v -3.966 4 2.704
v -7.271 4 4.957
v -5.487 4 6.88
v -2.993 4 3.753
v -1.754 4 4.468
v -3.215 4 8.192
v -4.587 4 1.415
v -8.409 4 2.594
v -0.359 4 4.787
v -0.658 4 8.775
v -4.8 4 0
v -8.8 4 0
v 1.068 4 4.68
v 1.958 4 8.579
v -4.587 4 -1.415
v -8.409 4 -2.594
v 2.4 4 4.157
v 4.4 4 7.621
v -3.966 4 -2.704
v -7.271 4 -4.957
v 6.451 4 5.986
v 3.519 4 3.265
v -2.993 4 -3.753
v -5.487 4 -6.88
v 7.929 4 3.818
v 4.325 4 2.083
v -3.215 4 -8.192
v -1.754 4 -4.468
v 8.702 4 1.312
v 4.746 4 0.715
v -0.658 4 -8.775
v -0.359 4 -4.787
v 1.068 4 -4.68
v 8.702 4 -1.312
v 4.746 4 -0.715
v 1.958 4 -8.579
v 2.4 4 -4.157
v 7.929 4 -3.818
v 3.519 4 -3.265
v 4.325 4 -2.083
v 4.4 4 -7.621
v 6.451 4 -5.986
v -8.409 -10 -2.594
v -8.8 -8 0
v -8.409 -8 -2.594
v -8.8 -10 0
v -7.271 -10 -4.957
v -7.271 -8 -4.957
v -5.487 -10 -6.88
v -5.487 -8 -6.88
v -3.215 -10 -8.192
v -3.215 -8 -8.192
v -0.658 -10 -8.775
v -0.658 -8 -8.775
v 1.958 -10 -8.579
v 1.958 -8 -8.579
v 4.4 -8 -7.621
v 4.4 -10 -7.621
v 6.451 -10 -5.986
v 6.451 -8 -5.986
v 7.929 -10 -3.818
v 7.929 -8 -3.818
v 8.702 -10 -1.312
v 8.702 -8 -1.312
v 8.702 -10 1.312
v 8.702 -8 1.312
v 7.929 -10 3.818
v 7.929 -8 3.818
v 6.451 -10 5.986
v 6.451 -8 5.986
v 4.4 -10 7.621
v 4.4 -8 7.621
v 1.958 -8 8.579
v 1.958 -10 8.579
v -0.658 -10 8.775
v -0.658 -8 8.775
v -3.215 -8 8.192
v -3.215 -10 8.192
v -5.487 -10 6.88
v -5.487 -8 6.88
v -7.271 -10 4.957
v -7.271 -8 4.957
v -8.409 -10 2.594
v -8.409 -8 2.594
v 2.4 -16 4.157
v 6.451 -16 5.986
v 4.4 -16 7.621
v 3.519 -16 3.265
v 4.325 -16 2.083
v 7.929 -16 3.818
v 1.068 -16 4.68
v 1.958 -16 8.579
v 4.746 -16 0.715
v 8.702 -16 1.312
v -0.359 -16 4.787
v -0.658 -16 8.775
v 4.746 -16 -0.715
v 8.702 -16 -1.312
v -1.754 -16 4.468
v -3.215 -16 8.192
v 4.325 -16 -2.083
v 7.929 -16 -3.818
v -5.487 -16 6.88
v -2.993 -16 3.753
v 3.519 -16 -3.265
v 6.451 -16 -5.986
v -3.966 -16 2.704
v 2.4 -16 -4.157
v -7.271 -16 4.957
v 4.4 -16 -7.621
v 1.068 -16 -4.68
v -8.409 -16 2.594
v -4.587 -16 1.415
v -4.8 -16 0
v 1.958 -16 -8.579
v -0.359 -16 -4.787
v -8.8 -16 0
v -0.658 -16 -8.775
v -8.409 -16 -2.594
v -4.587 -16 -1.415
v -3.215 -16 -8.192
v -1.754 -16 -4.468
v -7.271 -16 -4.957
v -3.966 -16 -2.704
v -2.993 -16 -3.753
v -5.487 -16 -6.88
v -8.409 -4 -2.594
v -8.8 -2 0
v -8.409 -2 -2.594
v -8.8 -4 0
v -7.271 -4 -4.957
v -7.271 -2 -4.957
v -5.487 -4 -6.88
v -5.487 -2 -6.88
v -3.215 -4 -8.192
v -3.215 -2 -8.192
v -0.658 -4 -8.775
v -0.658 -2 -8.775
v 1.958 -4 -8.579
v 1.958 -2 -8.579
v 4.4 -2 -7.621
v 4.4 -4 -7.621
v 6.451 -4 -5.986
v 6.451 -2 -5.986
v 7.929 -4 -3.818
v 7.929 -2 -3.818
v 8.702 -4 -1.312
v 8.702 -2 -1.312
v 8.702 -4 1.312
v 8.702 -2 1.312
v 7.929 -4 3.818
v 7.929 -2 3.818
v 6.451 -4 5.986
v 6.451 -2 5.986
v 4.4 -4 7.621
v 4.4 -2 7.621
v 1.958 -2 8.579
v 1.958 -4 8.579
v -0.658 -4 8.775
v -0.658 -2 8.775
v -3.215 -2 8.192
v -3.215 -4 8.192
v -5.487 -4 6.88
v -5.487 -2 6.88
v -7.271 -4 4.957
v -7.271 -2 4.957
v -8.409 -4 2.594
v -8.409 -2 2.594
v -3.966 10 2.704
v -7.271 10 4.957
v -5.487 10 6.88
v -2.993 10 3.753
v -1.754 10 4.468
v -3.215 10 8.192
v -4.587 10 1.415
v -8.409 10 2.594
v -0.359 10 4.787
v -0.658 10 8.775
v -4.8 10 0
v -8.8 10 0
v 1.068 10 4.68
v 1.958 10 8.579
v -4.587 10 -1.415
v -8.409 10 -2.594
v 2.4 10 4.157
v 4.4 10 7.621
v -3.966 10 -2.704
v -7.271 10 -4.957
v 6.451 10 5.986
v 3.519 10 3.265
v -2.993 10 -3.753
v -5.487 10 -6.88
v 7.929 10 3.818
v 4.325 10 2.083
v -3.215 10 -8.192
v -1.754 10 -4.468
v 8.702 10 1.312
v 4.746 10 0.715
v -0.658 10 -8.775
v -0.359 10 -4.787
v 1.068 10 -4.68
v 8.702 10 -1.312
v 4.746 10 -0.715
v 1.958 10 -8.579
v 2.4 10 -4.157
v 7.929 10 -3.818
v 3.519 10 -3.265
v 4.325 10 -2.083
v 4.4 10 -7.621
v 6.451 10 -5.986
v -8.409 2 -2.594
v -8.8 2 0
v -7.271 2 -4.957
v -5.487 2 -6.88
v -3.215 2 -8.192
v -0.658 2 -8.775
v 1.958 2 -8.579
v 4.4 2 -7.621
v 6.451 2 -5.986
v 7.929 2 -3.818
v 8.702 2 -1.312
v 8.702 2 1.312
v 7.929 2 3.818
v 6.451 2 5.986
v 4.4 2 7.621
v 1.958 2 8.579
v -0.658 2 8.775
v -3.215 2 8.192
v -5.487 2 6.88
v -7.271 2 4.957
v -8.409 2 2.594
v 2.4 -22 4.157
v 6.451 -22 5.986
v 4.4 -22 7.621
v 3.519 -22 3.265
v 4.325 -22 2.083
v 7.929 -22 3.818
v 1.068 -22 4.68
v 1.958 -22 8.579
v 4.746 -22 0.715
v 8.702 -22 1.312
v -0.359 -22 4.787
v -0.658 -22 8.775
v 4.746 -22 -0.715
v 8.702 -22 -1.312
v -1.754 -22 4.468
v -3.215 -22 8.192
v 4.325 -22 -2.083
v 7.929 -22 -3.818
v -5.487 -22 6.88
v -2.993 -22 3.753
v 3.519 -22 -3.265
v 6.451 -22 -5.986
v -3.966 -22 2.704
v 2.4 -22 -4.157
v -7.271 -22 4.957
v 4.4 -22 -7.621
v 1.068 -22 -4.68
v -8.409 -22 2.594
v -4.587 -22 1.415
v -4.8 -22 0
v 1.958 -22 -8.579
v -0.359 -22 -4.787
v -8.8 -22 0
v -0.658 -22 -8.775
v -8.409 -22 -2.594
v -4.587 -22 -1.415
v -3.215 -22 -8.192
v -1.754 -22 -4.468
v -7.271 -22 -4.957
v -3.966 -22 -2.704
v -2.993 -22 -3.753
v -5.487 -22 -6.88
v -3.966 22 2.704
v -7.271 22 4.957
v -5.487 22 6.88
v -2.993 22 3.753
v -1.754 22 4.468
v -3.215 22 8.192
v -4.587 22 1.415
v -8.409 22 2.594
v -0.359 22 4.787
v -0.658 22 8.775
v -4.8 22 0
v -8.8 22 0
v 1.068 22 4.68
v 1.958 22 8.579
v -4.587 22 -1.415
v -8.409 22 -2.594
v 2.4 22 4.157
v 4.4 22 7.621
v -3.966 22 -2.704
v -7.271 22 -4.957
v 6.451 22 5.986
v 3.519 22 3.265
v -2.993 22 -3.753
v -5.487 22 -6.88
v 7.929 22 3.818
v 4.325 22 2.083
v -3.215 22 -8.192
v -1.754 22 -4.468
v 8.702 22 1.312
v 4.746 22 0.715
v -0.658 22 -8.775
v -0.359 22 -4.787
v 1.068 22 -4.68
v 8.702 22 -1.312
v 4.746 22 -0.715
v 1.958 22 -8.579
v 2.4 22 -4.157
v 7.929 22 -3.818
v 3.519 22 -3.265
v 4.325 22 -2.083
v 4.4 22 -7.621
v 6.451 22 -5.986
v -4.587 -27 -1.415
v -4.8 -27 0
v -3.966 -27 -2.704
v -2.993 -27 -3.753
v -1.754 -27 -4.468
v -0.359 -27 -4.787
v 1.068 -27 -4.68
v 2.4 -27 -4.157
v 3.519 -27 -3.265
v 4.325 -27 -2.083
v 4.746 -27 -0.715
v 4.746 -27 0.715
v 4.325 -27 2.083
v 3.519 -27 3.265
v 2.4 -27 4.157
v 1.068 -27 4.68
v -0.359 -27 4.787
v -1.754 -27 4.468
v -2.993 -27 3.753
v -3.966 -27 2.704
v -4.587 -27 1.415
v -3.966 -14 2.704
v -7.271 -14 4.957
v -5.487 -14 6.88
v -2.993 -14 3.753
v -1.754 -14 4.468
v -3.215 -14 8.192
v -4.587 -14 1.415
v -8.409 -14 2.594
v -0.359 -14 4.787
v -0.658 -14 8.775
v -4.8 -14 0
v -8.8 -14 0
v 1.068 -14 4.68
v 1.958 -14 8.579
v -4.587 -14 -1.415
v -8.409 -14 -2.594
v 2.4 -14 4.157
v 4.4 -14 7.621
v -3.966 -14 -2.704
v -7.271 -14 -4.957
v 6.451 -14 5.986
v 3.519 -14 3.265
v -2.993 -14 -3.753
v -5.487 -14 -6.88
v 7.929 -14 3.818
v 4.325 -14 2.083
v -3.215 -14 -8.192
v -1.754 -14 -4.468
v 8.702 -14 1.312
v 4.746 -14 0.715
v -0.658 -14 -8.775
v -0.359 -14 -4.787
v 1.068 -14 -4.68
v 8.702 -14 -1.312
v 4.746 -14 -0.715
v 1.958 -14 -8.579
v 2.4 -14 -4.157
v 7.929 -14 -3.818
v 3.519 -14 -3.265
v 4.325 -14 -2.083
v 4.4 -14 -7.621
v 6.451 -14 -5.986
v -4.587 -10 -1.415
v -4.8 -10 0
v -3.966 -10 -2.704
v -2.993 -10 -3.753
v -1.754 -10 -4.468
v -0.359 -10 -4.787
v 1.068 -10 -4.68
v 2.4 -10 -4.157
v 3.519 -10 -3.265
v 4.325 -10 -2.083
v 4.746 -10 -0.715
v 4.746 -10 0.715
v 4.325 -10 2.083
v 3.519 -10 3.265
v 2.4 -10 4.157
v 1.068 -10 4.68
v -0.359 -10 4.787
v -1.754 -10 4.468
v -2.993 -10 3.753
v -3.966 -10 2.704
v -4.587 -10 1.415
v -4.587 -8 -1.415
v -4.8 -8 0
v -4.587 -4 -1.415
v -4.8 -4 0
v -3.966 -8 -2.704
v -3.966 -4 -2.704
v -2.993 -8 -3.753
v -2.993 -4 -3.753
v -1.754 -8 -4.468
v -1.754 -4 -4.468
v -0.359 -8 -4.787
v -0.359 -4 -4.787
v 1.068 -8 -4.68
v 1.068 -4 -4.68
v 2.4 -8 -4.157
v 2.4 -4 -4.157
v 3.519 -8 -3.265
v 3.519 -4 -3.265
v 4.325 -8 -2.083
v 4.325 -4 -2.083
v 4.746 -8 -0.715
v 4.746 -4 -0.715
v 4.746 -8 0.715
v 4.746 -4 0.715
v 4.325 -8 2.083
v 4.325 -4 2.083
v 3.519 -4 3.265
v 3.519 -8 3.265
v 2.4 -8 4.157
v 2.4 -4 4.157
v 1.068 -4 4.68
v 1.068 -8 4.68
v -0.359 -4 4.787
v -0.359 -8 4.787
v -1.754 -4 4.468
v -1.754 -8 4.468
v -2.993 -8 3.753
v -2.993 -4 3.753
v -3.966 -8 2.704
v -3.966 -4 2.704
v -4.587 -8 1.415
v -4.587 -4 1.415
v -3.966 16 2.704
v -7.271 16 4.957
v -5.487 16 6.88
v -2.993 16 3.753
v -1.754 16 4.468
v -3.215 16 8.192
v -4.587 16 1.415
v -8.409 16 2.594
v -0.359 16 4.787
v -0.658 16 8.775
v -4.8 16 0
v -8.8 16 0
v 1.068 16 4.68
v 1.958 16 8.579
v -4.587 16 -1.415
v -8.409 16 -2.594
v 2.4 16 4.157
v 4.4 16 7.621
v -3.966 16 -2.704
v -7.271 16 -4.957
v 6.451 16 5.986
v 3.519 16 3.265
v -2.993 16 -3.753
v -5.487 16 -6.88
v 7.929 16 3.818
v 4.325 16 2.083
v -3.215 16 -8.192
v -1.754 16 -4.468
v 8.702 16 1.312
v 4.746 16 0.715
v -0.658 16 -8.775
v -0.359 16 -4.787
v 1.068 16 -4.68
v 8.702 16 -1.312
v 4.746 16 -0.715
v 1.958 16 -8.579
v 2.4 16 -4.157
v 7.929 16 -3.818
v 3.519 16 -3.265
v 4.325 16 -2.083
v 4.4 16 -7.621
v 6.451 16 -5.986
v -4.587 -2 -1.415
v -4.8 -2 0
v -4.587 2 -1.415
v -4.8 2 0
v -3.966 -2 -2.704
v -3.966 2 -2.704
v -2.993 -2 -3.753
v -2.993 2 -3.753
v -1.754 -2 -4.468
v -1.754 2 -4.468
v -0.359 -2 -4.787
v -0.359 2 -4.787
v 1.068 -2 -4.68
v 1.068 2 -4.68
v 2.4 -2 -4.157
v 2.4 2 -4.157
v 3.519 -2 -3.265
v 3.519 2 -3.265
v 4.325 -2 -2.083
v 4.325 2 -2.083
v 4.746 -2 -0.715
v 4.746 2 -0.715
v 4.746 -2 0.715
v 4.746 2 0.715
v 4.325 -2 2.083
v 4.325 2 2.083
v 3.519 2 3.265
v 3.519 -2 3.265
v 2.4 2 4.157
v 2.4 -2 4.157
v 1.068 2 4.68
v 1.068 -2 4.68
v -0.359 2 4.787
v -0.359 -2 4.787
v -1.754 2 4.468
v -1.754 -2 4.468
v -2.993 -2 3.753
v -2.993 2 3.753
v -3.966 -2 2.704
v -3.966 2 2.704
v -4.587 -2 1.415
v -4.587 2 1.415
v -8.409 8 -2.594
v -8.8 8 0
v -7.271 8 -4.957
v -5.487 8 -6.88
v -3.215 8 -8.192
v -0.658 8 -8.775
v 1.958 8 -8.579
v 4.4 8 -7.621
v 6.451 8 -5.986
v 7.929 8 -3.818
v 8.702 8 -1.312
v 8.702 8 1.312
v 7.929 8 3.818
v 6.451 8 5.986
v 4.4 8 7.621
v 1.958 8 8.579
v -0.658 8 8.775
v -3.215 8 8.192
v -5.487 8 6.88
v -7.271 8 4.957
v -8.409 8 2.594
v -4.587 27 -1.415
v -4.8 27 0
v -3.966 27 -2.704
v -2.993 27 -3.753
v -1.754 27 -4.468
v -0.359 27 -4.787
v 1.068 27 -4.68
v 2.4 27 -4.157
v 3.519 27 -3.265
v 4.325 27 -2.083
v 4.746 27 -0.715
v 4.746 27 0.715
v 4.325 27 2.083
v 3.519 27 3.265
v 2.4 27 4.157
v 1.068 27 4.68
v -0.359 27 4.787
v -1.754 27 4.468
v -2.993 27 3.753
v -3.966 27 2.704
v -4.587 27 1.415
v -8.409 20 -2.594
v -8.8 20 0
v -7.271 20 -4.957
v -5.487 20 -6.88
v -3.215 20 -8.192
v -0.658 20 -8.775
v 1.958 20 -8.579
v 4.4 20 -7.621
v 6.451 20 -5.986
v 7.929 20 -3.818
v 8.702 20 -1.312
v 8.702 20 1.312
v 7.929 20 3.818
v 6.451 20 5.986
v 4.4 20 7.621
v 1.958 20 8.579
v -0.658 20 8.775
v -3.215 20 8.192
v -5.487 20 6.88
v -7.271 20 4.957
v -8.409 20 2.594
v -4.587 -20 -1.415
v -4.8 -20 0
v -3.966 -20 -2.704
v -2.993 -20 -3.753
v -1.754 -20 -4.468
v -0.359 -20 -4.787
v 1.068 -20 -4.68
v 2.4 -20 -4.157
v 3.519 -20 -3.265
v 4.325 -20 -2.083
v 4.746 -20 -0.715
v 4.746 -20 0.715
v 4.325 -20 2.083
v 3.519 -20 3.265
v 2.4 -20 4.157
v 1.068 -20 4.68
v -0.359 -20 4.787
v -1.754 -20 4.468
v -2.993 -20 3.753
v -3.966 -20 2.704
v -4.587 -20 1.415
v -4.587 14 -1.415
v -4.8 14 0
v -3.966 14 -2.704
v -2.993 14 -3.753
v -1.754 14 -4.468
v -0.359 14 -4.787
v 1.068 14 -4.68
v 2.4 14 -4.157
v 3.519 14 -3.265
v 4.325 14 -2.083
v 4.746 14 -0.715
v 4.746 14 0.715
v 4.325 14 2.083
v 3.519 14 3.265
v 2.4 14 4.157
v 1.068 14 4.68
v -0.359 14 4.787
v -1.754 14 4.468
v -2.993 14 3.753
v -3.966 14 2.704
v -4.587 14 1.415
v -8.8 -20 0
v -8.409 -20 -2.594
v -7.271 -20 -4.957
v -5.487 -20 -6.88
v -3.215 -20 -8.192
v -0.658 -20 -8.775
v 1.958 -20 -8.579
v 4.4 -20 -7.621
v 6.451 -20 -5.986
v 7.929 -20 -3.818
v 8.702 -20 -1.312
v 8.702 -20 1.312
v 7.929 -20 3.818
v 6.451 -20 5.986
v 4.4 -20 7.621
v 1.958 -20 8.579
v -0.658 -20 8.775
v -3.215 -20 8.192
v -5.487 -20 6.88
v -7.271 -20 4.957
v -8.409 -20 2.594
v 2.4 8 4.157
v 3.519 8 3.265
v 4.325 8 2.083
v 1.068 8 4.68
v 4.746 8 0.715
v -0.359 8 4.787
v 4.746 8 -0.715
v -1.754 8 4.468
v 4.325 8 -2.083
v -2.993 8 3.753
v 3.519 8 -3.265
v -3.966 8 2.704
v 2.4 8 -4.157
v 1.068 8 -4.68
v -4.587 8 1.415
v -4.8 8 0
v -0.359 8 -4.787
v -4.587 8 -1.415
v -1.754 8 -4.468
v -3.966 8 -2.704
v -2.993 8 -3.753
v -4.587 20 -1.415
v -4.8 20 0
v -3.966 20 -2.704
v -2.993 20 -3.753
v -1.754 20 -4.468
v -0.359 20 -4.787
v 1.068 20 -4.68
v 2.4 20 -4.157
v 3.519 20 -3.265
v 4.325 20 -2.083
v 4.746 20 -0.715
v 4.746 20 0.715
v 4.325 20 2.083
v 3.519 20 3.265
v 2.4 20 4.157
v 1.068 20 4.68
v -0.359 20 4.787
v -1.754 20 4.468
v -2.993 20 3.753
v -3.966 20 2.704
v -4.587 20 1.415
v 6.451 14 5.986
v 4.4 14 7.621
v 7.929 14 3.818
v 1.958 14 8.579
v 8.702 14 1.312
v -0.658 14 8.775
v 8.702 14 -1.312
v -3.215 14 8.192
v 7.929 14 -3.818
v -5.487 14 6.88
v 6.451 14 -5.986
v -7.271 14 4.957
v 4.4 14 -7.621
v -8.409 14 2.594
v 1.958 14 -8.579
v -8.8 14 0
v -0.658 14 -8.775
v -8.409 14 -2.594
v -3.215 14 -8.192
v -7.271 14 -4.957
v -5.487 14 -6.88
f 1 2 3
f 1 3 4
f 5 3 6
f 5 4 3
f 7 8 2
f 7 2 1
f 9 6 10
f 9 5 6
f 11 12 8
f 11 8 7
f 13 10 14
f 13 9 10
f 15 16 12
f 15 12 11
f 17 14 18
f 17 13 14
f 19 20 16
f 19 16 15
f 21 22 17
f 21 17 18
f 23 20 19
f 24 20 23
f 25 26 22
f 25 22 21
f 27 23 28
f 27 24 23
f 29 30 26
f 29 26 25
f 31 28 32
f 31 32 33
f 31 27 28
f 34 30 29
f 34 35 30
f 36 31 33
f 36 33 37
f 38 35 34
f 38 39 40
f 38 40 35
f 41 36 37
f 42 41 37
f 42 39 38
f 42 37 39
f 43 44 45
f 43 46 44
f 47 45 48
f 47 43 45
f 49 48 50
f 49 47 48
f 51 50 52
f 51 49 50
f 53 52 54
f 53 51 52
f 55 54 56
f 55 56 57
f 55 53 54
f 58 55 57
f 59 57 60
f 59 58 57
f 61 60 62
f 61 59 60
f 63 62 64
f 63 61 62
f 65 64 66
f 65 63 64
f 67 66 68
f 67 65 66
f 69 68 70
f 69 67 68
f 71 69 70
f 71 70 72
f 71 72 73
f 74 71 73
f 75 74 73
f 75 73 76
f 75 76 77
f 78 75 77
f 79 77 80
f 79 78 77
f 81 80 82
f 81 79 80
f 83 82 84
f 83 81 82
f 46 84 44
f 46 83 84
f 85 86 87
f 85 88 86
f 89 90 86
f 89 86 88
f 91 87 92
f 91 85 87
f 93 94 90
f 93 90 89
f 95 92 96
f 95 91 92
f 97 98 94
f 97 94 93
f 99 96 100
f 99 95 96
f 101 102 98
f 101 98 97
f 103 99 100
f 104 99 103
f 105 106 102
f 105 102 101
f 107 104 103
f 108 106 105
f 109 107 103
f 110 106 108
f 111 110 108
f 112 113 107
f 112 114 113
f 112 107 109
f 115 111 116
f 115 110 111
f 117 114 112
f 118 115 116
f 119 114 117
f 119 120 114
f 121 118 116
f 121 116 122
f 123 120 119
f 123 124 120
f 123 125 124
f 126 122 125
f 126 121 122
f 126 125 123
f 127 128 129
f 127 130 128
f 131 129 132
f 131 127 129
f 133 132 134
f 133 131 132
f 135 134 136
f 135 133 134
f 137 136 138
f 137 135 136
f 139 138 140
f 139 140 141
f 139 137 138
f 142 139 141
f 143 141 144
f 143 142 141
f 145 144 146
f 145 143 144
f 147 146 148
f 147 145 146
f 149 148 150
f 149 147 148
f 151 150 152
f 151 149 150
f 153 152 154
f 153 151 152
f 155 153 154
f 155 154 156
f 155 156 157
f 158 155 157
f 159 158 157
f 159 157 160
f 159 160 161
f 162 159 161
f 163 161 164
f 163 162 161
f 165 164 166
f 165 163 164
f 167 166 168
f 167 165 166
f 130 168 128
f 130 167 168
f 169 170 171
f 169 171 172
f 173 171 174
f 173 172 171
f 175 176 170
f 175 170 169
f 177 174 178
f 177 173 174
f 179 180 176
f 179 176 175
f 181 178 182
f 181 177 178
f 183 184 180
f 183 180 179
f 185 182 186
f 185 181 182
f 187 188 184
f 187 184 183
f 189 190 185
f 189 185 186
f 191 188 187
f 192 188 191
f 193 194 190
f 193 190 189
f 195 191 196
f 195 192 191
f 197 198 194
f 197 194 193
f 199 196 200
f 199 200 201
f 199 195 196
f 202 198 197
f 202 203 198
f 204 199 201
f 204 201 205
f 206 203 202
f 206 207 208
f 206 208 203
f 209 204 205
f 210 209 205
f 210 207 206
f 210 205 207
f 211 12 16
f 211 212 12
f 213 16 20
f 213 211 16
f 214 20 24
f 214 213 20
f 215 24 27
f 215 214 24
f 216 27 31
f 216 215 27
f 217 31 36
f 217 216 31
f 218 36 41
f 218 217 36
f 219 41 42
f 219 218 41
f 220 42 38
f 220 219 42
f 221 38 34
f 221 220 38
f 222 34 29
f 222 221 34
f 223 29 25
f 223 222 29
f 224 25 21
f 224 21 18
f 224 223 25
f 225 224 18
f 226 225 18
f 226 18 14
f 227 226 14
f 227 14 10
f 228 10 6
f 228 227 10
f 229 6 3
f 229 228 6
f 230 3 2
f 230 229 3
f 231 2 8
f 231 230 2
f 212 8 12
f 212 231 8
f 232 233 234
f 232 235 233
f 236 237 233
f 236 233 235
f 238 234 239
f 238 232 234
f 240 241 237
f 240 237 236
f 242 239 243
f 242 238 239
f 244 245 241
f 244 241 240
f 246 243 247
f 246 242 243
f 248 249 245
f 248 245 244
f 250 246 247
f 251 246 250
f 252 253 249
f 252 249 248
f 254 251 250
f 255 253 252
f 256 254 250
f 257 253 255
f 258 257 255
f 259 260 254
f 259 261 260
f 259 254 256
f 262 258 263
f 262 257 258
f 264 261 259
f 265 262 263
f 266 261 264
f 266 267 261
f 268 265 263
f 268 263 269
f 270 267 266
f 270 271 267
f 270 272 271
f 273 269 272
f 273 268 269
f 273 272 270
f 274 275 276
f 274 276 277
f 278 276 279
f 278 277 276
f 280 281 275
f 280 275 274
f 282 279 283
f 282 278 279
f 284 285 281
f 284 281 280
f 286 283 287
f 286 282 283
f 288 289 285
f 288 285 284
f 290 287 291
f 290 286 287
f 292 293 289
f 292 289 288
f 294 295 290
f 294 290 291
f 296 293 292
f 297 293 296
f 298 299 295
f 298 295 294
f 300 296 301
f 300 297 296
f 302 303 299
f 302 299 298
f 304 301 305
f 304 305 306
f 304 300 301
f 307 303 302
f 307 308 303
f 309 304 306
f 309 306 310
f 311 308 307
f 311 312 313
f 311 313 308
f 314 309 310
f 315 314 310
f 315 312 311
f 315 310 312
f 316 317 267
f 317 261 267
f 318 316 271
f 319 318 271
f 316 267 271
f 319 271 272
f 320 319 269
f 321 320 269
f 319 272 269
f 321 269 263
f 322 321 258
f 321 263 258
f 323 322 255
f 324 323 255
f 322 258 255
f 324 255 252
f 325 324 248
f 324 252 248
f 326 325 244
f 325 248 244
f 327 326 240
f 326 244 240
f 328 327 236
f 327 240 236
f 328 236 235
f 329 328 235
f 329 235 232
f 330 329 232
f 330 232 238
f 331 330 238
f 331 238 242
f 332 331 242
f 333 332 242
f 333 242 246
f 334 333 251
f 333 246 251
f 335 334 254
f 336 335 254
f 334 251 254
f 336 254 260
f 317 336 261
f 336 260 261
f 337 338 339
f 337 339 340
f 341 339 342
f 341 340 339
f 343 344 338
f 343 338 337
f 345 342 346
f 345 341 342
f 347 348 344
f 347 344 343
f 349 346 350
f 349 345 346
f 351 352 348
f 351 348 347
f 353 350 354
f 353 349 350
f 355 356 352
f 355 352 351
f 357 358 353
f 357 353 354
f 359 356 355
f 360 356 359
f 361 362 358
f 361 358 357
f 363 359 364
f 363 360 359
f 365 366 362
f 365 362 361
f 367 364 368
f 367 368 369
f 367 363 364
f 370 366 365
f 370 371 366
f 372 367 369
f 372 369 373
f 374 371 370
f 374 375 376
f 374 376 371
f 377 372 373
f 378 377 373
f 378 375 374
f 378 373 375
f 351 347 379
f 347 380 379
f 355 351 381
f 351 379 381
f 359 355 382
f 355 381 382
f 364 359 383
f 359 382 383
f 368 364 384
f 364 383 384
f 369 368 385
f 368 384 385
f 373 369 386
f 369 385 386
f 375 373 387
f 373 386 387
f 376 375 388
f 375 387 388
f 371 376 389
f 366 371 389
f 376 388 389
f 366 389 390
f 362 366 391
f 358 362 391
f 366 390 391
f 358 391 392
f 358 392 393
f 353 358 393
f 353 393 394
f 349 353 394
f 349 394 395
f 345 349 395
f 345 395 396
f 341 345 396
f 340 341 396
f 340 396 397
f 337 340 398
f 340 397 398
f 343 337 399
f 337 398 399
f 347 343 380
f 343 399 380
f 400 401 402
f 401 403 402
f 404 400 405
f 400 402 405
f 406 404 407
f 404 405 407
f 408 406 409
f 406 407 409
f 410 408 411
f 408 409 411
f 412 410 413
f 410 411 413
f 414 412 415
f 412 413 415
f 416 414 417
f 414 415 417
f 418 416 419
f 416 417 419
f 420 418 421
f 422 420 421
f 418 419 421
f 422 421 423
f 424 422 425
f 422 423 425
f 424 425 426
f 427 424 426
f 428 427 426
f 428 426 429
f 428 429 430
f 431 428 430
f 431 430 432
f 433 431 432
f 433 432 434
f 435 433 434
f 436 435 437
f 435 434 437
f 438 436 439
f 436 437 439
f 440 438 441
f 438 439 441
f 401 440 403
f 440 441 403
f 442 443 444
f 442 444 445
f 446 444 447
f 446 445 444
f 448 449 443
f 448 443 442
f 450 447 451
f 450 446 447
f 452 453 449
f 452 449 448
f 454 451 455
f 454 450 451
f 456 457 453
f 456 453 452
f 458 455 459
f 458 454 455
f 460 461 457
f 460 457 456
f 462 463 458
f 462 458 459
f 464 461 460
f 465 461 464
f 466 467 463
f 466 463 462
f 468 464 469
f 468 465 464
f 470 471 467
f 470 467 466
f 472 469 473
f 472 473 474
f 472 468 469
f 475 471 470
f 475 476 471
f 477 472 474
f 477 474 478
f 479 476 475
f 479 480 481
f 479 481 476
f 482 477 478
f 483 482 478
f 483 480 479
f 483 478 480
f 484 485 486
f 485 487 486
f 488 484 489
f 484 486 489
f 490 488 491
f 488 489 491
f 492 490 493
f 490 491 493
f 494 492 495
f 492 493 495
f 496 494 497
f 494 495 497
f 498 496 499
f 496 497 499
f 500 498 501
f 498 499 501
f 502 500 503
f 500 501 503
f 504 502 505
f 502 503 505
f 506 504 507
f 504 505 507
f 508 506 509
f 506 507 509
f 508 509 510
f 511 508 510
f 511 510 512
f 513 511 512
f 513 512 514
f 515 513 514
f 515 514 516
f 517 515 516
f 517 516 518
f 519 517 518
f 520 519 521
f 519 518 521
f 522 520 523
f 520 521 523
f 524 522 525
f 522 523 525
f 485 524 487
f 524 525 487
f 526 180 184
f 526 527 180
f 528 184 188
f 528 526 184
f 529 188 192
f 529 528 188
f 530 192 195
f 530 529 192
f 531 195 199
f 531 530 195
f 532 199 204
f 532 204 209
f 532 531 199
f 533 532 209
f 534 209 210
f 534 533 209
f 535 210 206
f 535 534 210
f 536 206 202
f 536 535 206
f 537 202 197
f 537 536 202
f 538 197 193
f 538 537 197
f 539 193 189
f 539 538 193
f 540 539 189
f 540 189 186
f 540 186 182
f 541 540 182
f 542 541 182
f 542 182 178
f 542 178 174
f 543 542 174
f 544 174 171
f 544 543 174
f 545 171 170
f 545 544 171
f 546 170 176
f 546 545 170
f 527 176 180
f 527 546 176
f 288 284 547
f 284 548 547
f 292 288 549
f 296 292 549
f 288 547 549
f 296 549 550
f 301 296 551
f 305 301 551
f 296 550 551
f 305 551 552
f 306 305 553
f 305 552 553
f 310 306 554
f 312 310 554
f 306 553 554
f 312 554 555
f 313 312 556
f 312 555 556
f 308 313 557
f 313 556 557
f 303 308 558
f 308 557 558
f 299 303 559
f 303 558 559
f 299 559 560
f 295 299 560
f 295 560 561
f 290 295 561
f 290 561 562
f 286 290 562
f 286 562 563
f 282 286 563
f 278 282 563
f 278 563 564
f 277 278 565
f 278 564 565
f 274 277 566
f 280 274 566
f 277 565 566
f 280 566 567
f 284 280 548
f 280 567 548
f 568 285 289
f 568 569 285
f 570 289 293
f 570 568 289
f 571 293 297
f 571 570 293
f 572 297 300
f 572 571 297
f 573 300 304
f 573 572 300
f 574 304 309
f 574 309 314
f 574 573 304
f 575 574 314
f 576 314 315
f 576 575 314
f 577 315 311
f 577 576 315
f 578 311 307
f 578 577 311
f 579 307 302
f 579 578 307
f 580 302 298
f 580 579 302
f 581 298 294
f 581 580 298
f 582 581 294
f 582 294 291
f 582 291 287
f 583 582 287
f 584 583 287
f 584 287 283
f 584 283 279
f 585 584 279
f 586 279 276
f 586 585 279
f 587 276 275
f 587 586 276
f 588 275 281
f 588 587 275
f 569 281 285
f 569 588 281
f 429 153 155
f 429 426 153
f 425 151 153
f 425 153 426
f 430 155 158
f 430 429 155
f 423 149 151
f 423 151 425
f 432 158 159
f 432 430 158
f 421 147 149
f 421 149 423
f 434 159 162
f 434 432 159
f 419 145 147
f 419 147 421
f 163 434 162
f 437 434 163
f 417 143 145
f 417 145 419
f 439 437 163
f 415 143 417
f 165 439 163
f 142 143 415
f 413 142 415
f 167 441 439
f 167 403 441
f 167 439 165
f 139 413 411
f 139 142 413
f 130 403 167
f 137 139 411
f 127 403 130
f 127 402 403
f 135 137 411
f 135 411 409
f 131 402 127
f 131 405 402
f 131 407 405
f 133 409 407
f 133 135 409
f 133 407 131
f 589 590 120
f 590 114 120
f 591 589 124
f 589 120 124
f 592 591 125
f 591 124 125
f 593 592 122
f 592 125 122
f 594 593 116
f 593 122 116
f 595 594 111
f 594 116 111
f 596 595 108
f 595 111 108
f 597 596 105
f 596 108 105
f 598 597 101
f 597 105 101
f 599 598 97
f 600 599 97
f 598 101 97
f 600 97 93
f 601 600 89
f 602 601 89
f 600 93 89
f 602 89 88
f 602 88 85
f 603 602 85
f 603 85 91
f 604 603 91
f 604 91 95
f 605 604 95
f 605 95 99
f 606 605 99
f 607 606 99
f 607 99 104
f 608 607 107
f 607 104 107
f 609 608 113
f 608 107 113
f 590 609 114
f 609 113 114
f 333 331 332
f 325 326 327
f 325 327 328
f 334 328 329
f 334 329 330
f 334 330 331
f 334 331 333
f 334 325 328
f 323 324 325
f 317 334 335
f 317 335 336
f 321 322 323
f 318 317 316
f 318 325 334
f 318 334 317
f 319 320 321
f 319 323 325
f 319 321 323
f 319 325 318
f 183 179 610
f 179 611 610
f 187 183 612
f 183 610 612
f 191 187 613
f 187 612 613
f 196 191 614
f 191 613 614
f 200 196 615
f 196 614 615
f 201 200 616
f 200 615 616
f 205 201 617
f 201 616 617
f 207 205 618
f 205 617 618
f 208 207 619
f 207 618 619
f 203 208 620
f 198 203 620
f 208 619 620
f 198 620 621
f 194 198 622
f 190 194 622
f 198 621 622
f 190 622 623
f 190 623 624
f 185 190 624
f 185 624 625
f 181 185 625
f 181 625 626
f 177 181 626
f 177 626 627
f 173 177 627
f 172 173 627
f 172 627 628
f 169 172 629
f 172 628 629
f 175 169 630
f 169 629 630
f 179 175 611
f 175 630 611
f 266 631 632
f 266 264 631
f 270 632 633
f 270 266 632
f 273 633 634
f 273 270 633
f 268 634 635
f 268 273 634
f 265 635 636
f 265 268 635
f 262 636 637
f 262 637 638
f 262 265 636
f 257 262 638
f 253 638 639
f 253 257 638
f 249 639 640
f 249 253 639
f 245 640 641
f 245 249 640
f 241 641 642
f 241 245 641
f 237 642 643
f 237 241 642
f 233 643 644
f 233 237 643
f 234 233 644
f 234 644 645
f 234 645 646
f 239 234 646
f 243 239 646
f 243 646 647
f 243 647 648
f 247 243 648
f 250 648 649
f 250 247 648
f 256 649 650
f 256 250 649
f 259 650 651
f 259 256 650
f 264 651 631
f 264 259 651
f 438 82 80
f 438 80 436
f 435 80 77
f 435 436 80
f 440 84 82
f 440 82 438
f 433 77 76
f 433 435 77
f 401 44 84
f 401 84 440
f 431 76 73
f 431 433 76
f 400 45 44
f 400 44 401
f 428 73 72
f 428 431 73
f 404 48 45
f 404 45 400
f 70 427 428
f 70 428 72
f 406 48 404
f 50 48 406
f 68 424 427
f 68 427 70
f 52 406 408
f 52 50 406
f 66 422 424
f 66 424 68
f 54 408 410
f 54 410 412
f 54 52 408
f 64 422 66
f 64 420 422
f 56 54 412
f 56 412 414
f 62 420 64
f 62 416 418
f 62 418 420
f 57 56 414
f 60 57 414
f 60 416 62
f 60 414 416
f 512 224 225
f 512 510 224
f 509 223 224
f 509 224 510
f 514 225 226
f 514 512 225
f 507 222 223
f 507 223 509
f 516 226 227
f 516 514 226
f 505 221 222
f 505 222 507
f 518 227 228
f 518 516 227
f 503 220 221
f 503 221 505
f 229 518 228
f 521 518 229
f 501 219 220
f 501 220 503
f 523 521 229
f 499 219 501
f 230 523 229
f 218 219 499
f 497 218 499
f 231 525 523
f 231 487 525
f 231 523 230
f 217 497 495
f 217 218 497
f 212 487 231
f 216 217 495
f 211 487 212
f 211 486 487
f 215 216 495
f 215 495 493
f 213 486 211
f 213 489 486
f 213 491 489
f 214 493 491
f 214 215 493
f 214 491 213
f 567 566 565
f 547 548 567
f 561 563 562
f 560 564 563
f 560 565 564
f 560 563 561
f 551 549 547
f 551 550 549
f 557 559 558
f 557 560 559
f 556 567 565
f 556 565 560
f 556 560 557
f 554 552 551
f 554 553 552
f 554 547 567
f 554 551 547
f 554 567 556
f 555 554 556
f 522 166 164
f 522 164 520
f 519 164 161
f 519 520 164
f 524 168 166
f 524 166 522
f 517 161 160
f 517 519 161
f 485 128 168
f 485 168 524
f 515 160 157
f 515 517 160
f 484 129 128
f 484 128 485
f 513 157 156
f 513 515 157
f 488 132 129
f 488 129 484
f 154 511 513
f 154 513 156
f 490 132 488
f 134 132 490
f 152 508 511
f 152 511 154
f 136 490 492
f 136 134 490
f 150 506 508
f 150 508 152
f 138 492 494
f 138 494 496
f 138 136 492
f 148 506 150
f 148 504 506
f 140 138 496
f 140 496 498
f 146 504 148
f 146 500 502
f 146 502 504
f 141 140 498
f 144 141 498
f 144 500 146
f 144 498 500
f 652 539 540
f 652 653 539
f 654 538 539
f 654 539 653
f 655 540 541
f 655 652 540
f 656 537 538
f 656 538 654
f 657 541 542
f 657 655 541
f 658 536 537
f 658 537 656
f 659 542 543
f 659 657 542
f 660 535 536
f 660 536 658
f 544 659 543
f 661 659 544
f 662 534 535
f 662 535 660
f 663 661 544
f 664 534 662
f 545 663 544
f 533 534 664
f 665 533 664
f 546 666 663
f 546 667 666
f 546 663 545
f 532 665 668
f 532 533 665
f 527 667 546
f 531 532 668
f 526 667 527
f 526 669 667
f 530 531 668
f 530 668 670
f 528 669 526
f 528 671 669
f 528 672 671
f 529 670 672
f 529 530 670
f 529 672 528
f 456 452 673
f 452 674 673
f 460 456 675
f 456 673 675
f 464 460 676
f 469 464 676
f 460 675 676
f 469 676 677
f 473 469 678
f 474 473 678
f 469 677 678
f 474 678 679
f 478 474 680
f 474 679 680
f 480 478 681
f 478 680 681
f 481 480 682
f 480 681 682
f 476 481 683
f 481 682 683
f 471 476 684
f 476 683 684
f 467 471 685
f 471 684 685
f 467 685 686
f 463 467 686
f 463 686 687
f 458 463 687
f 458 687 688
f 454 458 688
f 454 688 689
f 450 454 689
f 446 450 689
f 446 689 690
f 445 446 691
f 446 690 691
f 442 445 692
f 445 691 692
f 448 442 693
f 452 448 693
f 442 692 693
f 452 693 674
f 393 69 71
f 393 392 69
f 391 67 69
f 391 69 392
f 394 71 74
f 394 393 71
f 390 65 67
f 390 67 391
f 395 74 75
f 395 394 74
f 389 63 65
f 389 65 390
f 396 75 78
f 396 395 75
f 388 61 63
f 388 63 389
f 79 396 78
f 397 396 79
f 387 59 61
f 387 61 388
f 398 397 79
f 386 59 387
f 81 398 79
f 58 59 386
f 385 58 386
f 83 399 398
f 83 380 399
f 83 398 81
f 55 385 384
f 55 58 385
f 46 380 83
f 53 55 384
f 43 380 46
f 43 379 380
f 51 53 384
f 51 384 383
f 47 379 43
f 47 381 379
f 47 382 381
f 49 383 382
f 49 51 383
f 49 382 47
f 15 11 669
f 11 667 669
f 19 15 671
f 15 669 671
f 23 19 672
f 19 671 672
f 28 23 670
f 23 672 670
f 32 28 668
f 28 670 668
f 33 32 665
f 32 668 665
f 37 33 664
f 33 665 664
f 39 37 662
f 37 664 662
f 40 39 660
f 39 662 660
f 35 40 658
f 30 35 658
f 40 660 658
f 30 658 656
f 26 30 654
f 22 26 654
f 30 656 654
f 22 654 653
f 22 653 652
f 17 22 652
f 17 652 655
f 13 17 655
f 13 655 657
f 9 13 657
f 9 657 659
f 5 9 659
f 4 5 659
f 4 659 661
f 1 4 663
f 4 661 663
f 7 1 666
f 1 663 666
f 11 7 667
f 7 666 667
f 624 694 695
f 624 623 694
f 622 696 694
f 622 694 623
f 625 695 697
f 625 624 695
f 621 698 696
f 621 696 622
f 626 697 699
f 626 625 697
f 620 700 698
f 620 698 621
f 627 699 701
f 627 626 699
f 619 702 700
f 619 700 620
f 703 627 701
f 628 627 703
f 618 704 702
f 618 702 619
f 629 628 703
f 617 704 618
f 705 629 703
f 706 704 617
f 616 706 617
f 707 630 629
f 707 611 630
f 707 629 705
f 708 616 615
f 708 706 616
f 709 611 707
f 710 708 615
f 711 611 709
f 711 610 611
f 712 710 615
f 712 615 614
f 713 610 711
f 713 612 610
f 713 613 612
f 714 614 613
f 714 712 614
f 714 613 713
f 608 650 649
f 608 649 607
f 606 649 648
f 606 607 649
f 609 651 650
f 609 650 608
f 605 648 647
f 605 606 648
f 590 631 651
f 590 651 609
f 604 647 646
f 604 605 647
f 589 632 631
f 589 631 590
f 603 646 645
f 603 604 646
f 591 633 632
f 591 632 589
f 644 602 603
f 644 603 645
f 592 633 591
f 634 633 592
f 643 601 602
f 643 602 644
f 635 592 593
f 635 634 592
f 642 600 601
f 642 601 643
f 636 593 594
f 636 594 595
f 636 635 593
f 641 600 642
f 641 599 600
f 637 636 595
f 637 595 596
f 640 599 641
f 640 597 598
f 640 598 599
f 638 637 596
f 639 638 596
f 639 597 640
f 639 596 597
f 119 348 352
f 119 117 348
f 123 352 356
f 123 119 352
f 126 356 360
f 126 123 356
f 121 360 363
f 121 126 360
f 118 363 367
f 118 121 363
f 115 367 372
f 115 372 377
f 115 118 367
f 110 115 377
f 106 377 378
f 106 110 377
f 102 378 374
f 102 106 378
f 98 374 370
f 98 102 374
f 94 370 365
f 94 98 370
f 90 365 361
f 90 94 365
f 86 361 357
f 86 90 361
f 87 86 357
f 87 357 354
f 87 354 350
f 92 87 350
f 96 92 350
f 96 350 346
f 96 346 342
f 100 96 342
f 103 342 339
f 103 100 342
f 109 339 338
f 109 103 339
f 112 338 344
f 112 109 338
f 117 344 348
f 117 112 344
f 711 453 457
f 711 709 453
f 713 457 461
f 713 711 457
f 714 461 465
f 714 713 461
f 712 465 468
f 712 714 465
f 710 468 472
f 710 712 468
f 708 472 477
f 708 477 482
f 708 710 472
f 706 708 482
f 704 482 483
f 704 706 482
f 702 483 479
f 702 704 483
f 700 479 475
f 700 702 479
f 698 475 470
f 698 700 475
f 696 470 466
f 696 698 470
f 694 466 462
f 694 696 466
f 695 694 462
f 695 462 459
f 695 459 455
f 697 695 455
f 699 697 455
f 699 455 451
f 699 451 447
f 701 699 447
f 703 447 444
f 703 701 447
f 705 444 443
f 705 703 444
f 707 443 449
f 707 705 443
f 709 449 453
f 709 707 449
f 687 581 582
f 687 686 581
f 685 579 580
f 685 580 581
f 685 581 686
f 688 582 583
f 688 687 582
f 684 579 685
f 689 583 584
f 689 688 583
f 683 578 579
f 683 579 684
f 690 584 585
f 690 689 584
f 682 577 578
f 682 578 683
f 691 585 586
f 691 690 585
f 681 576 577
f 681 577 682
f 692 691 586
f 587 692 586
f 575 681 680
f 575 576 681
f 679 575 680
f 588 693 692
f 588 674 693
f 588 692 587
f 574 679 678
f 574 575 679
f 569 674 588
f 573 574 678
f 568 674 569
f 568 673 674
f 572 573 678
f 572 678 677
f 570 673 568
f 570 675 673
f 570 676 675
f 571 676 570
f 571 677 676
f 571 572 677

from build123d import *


with BuildPart() as part:
    # Sketch1 → Revolve1 (revolve)
    with BuildSketch(Plane.XY, mode=Mode.PRIVATE) as revolve1_sk:
        Polygon((4.8, 24), (4.8, 22), (8.8, 22), (8.8, 20), (4.8, 20.000000056), (4.8, 18), (4.8, 16), (8.8, 16), (8.8, 14), (4.8, 14), (4.8, 11), (4.8, 10), (8.8, 10), (8.8, 8), (4.8, 8), (4.8, 5), (4.8, 4), (8.8, 4), (8.8, 2), (4.8, 2), (4.8, -1), (4.8, -2), (8.8, -2), (8.8, -4), (4.8, -4), (4.8, -7), (4.8, -8), (8.8, -8), (8.8, -10), (4.8, -10), (4.8, -13), (4.8, -14), (8.8, -14), (8.8, -16), (4.8, -16), (4.8, -19), (4.8, -20), (8.8, -20), (8.8, -22), (4.8, -22), (4.8, -24), (4.8, -27), (0, -27), (0, 27), (4.8, 27), align=None)
    revolve(revolve1_sk.sketch.rotate(Axis((0, 27, 0), (0, -1, 0)), 180), axis=Axis((0, 27, 0), (0, -1, 0)))


solid = part.part
